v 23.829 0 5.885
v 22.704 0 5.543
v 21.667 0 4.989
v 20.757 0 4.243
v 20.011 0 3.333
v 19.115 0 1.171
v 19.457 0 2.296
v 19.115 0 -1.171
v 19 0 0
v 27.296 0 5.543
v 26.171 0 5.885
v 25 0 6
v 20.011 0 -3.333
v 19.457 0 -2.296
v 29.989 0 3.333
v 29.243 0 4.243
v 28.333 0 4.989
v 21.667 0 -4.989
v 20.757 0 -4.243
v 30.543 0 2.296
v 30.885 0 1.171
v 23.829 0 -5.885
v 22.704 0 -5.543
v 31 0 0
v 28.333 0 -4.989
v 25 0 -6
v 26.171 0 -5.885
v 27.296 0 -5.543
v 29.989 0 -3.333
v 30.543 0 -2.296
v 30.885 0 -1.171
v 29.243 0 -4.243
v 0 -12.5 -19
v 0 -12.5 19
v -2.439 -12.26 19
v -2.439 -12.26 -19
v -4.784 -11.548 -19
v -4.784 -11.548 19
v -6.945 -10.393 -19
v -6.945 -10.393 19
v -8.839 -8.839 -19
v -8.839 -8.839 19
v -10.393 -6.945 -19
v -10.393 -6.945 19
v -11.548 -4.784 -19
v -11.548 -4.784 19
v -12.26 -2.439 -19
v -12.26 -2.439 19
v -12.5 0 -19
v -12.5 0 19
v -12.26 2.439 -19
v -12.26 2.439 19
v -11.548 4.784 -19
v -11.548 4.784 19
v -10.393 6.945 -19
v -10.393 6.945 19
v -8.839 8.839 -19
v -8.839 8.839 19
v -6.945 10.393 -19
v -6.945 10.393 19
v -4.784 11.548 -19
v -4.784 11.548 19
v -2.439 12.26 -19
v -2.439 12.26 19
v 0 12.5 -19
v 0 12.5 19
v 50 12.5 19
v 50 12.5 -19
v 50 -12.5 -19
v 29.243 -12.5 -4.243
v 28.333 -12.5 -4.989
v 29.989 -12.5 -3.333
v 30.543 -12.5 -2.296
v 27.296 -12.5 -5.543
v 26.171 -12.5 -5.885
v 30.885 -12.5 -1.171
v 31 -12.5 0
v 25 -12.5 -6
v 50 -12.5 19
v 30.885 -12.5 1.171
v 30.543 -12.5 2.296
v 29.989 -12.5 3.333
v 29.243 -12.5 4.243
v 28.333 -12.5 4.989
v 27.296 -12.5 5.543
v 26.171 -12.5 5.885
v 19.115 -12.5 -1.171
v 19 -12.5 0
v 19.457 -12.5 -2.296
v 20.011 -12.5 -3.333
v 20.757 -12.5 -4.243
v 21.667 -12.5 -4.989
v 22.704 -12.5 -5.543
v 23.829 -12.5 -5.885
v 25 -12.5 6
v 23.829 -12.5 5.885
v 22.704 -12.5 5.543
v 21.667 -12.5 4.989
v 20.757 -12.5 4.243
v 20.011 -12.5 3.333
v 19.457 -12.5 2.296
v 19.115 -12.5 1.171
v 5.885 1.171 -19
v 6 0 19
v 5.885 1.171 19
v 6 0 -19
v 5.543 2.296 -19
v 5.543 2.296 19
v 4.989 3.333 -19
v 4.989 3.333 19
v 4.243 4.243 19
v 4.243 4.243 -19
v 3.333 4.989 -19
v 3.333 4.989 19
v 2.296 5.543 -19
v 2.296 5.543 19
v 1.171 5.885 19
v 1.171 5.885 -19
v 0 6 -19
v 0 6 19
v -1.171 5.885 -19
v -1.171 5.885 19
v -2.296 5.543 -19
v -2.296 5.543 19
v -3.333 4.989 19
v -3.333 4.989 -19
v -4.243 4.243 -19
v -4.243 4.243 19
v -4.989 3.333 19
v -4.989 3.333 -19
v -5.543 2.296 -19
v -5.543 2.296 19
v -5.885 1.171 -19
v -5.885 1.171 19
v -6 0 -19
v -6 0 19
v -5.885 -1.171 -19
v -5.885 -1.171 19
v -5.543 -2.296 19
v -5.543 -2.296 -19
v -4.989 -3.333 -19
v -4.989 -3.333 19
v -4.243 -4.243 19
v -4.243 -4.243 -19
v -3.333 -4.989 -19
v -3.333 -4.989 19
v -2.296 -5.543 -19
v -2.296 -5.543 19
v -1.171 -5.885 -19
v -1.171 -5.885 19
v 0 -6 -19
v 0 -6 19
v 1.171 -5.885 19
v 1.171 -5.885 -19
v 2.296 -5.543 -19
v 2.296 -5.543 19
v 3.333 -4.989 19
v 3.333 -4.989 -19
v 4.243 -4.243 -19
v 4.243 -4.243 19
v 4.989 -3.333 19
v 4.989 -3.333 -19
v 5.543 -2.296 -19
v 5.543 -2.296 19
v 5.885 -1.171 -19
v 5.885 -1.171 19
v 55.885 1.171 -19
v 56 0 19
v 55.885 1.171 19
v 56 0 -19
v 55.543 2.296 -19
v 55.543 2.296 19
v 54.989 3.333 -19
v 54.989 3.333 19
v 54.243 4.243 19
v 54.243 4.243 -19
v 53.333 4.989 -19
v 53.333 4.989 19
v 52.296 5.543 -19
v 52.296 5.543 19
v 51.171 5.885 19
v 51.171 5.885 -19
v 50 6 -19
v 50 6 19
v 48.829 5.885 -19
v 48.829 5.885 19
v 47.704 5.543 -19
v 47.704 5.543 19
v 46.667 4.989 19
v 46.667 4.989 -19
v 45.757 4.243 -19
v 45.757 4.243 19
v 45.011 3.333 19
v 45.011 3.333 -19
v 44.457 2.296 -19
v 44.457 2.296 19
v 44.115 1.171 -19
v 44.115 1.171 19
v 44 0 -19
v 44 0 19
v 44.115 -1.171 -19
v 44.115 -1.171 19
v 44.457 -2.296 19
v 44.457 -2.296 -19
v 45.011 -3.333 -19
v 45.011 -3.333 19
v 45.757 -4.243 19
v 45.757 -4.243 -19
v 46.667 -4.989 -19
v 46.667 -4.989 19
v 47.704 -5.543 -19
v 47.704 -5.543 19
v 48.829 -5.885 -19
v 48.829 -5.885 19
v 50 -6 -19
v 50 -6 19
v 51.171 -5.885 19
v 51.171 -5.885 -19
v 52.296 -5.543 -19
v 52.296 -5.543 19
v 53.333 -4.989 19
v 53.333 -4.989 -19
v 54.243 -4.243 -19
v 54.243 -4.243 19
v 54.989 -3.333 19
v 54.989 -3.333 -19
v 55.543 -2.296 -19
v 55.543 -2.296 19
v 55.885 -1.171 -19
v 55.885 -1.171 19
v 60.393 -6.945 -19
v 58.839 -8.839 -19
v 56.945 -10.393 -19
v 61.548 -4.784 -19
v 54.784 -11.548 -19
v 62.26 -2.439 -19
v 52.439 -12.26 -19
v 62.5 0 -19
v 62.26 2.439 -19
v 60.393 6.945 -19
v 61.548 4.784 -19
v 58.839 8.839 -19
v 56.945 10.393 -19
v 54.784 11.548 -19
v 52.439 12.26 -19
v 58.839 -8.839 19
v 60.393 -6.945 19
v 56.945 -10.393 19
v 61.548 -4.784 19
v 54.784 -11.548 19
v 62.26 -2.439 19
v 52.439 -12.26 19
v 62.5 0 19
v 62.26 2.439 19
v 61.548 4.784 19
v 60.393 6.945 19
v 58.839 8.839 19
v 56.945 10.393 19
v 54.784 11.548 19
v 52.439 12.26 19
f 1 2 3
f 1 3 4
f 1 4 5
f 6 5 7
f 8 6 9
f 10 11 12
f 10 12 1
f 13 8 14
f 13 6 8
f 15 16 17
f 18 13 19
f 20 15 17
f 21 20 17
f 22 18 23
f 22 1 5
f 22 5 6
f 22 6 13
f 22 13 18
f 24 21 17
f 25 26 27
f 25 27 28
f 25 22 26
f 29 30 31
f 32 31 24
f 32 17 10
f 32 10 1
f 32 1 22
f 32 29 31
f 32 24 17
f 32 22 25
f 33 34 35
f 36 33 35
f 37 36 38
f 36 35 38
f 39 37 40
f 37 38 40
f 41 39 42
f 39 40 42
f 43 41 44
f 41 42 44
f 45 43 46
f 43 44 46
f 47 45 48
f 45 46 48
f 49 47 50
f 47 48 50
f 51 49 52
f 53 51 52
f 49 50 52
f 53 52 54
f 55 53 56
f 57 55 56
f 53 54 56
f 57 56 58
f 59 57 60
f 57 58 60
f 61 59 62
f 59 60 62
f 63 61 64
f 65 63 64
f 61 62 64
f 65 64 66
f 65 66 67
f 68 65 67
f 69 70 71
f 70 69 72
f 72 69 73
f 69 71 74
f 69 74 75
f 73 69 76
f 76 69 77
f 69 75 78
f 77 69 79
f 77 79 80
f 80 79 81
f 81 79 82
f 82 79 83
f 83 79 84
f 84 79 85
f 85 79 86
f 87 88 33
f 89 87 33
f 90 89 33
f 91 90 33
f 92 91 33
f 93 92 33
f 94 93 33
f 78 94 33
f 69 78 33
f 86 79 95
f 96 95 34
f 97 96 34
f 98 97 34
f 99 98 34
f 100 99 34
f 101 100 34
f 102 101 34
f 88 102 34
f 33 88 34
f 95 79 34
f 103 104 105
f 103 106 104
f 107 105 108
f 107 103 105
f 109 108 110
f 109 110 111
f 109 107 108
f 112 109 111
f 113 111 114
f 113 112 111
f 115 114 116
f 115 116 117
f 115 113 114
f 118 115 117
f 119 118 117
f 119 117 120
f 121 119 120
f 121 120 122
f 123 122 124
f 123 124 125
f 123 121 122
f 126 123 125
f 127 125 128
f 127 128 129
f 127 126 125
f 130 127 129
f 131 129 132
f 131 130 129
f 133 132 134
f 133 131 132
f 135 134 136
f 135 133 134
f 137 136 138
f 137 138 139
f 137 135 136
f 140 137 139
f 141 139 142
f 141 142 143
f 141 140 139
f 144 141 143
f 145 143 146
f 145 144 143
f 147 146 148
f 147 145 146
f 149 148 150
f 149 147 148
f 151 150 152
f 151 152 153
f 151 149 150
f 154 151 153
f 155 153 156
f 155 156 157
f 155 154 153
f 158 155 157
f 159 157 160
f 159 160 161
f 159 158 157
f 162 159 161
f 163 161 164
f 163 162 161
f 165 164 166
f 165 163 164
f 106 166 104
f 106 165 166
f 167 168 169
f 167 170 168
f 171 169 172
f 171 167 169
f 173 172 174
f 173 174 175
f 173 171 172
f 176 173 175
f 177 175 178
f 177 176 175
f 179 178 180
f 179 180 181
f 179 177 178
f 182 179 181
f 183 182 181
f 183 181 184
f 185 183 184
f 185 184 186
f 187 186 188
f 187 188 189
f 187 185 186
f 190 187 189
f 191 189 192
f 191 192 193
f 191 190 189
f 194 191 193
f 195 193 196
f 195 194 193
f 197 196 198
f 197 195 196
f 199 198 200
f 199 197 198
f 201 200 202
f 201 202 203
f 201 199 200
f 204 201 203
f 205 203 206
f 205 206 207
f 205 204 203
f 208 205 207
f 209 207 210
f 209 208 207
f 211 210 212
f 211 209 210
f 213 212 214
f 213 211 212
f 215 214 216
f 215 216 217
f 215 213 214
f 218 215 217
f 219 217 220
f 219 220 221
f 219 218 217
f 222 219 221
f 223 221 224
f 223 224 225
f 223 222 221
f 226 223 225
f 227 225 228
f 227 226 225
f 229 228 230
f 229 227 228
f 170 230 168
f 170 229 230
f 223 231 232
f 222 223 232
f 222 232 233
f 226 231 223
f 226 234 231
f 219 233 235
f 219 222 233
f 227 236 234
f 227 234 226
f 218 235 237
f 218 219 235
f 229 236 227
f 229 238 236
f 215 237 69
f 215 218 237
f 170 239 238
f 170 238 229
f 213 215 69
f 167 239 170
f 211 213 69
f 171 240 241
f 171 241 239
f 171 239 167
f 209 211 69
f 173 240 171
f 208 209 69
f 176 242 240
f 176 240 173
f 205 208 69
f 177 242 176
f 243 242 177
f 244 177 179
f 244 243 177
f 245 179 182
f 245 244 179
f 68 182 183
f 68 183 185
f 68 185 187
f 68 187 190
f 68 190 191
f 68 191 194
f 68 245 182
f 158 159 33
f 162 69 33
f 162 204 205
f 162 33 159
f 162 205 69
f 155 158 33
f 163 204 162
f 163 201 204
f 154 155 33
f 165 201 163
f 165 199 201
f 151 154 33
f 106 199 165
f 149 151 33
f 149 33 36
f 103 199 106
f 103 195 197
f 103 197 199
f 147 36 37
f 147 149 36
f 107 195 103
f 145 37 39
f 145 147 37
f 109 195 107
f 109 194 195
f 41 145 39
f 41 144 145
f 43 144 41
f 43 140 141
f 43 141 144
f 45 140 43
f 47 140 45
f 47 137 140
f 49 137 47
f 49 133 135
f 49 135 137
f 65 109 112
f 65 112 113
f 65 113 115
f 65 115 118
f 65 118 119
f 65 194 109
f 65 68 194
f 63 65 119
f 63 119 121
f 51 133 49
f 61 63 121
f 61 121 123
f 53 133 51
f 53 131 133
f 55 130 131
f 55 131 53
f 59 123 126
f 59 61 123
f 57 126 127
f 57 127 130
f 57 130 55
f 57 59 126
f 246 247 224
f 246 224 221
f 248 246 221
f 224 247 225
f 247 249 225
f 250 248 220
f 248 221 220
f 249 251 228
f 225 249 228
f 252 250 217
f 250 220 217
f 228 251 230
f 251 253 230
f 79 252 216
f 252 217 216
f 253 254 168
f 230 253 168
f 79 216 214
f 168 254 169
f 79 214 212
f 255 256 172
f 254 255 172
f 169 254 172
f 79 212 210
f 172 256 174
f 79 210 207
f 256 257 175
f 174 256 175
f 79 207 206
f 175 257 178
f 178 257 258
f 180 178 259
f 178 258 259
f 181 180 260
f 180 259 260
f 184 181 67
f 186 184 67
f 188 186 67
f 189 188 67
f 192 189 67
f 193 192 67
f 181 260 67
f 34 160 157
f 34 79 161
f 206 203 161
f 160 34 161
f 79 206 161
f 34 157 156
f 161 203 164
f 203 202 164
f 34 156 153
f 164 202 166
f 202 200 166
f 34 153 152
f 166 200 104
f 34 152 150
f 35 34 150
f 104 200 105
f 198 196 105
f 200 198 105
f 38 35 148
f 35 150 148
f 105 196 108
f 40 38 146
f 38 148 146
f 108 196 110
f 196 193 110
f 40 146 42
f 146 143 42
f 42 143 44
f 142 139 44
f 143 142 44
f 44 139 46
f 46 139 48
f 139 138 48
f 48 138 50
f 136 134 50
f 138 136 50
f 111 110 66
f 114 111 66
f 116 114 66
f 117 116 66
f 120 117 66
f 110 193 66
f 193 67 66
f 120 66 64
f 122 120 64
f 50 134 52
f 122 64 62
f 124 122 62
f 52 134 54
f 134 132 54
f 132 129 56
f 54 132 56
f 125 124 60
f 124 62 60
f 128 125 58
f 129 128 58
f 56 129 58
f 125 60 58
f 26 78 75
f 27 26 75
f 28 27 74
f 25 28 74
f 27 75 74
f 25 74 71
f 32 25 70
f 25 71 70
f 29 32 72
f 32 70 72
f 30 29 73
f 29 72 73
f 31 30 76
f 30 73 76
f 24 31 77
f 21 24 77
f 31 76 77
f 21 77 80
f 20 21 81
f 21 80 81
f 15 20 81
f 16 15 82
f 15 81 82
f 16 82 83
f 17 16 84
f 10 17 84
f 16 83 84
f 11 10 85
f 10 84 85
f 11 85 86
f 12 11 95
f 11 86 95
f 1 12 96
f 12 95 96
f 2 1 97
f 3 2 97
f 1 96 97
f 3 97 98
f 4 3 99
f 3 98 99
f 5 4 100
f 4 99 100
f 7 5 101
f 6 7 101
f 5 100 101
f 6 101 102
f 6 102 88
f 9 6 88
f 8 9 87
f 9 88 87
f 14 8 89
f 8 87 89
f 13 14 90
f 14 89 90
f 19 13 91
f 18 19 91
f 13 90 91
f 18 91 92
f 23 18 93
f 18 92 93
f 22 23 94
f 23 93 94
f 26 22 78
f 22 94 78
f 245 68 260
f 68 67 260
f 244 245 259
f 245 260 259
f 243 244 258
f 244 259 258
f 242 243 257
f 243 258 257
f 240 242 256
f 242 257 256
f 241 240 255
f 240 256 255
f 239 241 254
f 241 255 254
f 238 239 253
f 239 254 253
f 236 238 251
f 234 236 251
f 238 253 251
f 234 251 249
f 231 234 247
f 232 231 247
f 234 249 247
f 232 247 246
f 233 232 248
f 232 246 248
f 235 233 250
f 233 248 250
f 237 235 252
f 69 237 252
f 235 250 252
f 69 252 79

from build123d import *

# Parameters (mm, degrees)
SKETCH1_R           = 6
BOSS_EXTRUDE1_DEPTH = 19
SKETCH2_R           = 6
CUT_EXTRUDE1_DEPTH  = 12.5


with BuildPart() as part:
    # Sketch1 → Boss-Extrude1 (new, symmetric)
    with BuildSketch(Plane.XY):
        with BuildLine():
            Line((0, 12.5), (50, 12.5))
            ThreePointArc((50, 12.5), (62.5, 0), (50, -12.5))
            Line((50, -12.5), (0, -12.5))
            ThreePointArc((0, -12.5), (-12.5, 0), (0, 12.5))
        make_face()
        Circle(SKETCH1_R, mode=Mode.SUBTRACT)
        with Locations((50, 0)):
            Circle(SKETCH1_R, mode=Mode.SUBTRACT)
    extrude(amount=BOSS_EXTRUDE1_DEPTH, both=True)

    # Sketch2 → Cut-Extrude1 (cut)
    with BuildSketch(Plane.XZ.offset(12.5)):
        with Locations(Location((25, 0, 0), (0, 0, 270))):
            Circle(SKETCH2_R)
    extrude(amount=-CUT_EXTRUDE1_DEPTH, mode=Mode.SUBTRACT)


solid = part.part
